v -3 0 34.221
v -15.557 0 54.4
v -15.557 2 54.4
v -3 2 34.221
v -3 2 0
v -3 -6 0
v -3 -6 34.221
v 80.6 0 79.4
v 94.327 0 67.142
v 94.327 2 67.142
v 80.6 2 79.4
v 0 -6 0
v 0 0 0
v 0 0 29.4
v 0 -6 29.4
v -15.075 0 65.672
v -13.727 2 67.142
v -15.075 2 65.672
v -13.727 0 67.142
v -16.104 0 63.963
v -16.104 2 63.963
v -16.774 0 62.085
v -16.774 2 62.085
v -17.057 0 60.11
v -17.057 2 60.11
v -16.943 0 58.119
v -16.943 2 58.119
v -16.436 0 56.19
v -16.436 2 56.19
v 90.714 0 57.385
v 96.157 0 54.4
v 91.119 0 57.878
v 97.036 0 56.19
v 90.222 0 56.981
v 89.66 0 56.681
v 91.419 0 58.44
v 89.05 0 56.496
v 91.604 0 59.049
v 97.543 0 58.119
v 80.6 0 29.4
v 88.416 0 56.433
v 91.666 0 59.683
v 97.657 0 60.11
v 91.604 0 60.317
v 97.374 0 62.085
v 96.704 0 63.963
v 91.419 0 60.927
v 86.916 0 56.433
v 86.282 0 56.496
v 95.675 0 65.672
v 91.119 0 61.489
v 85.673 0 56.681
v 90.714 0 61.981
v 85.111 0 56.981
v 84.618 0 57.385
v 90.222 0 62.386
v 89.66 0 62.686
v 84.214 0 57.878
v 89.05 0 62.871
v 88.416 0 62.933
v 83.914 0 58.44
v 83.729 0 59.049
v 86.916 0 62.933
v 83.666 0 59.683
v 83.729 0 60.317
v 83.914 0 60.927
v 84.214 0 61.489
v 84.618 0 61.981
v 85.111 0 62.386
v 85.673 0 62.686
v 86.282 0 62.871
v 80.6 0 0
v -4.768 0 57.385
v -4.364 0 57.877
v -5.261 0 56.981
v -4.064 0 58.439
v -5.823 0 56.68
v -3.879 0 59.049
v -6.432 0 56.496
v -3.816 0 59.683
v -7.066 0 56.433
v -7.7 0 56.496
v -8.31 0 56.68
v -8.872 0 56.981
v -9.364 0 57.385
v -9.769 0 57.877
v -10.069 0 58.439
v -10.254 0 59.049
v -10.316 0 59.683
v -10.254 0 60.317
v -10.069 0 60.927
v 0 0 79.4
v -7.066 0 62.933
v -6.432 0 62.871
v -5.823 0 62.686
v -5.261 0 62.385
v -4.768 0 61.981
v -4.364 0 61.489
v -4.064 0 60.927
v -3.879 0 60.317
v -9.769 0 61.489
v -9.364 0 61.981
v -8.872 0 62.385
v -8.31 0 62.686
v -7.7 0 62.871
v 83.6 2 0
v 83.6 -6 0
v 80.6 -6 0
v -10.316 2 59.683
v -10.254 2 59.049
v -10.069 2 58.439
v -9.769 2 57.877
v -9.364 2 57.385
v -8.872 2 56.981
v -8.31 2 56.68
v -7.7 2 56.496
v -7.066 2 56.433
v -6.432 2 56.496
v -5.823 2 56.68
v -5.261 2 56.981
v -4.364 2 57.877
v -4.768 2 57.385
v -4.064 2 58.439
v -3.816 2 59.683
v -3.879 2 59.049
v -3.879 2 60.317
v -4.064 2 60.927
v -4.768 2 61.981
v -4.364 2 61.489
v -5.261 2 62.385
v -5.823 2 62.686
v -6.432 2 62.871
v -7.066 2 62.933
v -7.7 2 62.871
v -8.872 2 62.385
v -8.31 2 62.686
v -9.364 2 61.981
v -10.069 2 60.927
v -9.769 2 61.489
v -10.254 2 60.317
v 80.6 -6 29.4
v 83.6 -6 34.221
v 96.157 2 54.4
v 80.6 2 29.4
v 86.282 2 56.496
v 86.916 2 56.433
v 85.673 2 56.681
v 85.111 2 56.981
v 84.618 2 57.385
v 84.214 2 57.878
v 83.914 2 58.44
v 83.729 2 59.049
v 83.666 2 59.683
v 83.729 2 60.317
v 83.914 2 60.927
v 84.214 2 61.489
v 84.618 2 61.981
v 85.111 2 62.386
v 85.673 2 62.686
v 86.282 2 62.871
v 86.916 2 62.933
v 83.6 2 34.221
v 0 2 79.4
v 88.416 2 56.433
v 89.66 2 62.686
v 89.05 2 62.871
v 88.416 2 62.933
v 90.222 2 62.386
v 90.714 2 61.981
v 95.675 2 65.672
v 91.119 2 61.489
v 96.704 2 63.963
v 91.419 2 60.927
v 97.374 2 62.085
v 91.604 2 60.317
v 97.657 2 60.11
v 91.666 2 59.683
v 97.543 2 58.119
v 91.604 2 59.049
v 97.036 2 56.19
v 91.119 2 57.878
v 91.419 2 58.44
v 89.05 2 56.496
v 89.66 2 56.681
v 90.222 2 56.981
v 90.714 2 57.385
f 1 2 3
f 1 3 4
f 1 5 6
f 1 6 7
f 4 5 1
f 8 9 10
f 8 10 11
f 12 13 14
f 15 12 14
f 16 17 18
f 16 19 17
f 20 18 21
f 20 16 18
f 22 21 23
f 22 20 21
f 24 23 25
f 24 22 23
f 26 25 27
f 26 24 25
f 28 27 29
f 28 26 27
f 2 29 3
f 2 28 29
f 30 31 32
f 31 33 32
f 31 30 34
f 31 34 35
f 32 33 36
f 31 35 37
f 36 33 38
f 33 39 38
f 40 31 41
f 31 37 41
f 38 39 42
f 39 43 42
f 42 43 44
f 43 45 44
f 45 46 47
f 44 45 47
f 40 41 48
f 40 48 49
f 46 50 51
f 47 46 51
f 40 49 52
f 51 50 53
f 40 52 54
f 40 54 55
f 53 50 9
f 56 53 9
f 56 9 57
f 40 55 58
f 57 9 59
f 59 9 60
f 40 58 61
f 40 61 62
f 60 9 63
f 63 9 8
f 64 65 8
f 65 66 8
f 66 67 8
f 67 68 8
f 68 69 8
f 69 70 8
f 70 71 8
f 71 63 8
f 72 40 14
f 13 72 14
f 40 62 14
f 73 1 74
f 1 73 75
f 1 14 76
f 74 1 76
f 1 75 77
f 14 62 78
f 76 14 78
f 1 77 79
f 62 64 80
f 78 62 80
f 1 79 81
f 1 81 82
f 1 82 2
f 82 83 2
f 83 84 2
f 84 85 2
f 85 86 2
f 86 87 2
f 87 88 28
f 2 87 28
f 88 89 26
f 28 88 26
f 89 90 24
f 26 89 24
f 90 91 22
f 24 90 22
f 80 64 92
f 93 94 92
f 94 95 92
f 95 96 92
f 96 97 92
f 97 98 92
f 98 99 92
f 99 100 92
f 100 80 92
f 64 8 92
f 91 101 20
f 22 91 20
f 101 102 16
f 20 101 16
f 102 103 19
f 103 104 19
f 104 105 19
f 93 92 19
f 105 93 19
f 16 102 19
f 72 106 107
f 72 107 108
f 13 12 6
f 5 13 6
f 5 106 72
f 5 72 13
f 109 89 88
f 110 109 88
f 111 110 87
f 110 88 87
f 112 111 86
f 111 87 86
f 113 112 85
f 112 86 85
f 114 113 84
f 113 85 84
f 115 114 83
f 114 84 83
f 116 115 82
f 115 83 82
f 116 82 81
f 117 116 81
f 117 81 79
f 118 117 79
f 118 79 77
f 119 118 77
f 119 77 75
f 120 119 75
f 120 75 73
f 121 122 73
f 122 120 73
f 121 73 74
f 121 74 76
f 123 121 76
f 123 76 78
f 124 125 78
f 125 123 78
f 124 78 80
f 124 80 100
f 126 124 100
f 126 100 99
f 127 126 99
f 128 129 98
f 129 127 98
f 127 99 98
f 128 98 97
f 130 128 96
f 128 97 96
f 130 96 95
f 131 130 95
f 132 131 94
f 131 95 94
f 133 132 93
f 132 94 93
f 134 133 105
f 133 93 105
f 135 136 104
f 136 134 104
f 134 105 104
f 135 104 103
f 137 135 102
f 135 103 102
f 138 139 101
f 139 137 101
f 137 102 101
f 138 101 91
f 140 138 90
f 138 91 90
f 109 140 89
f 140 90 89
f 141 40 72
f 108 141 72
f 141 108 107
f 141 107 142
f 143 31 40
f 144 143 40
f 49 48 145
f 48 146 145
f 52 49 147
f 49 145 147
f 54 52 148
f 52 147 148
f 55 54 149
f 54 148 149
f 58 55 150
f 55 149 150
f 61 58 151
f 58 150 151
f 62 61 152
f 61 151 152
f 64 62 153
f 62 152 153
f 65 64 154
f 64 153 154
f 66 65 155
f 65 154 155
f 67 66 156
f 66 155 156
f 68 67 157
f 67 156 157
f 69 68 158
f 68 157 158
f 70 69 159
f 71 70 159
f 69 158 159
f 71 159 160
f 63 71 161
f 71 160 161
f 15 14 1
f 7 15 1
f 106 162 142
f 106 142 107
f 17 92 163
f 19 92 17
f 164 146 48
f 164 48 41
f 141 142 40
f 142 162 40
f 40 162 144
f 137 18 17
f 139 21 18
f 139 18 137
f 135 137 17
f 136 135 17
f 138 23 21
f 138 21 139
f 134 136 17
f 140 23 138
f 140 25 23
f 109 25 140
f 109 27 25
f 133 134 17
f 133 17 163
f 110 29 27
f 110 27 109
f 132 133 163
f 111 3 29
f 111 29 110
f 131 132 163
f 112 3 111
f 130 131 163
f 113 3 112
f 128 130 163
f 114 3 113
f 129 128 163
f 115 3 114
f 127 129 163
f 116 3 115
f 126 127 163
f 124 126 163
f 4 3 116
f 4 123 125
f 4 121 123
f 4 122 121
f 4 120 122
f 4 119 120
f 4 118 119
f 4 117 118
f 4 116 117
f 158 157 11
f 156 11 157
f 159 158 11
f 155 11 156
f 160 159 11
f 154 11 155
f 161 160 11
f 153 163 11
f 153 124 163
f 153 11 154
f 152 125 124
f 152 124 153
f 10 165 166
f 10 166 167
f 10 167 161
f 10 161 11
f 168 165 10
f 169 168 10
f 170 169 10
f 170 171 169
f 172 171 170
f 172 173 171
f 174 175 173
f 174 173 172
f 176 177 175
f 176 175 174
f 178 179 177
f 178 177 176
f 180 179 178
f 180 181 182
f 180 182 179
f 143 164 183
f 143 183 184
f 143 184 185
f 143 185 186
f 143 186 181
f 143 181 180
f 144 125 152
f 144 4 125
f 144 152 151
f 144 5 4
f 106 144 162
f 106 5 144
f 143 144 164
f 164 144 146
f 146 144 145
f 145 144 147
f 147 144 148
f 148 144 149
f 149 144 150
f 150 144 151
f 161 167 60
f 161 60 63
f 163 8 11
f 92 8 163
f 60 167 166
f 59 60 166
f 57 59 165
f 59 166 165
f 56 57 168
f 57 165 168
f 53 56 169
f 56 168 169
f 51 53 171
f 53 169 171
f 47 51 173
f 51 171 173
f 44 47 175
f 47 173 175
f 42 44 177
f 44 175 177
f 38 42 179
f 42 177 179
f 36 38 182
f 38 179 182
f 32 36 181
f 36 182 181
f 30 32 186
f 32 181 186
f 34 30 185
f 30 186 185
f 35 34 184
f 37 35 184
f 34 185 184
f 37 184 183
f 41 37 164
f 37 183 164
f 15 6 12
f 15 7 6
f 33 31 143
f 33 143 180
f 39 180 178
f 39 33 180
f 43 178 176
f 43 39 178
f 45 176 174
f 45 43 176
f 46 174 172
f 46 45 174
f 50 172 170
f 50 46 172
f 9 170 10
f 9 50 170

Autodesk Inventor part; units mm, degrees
ref_plane "YZ Plane" through (0, 0, 0) normal (1, 0, 0) x (0, 1, 0)
ref_plane "XZ Plane" through (0, 0, 0) normal (0, 1, 0) x (-1, 0, 0)
sketch "草圖1" plane through (0, 0, 0) normal (0, 1, 0) x (-1, 0, 0)
  line L0 (0, 0) -> (-80.6, 0)
  line L1 (-80.6, 0) -> (-80.6, 79.4)
  line L2 (-80.6, 79.4) -> (0, 79.4)
  line L3 (0, 79.4) -> (0, 0)
  line L4 (-80.6, 79.4) -> (-80.6, 51.023)
  line L5 (-80.6, 79.4) -> (-80.6, 51.023)
  line L6 (-80.6, 51.023) -> (-80.6, 79.4)
  line L7 (-94.3269, 67.1422) -> (-80.6, 79.4)
  line L8 (-96.1567, 54.4) -> (-80.6, 29.4)
  circle A0 centre (-87.6663, 59.6833) radius 3.25
  arc A1 (-94.3269, 67.1422) -> (-96.1567, 54.4) centre (-87.6663, 59.6833) ccw
  line L9 (-40.2, 92.1708) -> (-40.2, -8.9293) construction
  line L10 (0, 79.4) -> (13.727, 67.142)
  line L11 (15.5567, 54.3998) -> (0, 29.3998)
  circle A2 centre (7.0663, 59.6831) radius 3.25
  arc A3 (15.5567, 54.3998) -> (13.727, 67.142) centre (7.0663, 59.6831) ccw
  point P0 (-100.6, 61.5405)
  point P1 (20, 61.5403)
  point P2 (17.5946, 57.6964)
  point P3 (10.5946, 57.6964)
  dimension "d0" = 80.6
  dimension "d1" = 79.4
  dimension "d7" = 50
  dimension "d10" = 20
  dimension "d11" = 6.5
  dimension "d12" = 10
  dimension "d13" = 25
  dimension "d17" = 20
  dimension "d18" = 6.5
  dimension "d19" = 10
  dimension "d20" = 25
  dimension "d42" = 7
  dimension "d51" = 13.727
extrude "擠出1" add sketch "草圖1" along normal blind 2
sketch "草圖11" plane through (0, 2, 0) normal (0, 1, 0) x (1, 0, 0)
  circle A0 centre (87.6663, -59.6833) radius 3.25 construction
  line L0 (88.4163, -62.9333) -> (86.9163, -62.9333)
  line L1 (83.6663, -59.6833) -> (83.6663, -59.6833)
  line L2 (86.9163, -56.4333) -> (88.4163, -56.4333)
  line L3 (91.6663, -59.6833) -> (91.6663, -59.6833)
  arc A1 (88.4163, -62.9333) -> (91.6663, -59.6833) centre (88.4163, -59.6833) ccw
  arc A2 (91.6663, -59.6833) -> (88.4163, -56.4333) centre (88.4163, -59.6833) ccw
  arc A3 (86.9163, -56.4333) -> (83.6663, -59.6833) centre (86.9163, -59.6833) ccw
  arc A4 (83.6663, -59.6833) -> (86.9163, -62.9333) centre (86.9163, -59.6833) ccw
  point P0 (0, 0)
  dimension "d46" = 4
  dimension "d47" = 4
  dimension "d48" = 3.25
extrude "擠出5" cut sketch "草圖11" against normal through all
sketch "草圖18" plane through (0, 2, 0) normal (0, 1, 0) x (1, 0, 0)
  line L0 (0, 0) -> (-3, 0)
  line L1 (0, -29.3998) -> (-15.5567, -54.3998) projected
  line L2 (0, 0) -> (0, -29.3998) projected
  line L3 (-3, 0) -> (-3, -34.2209)
  line L4 (40.2999, -89.2199) -> (40.2999, 11.3236) construction
  line L5 (80.5999, 0) -> (83.5999, 0)
  line L6 (80.5999, 0) -> (80.5999, -29.3998)
  line L7 (83.5999, 0) -> (83.5999, -34.2209)
  line L8 (96.1567, -54.4) -> (80.6, -29.4) projected
  line L9 (83.5999, -34.2209) -> (80.6, -29.4)
  dimension "d60" = 3
extrude "擠出7" add sketch "草圖18" against normal blind 8 contours L2 L1 L3 L0
ref_plane "工作平面4" through (40.3, -6, 29.3998) normal (1, 0, 0) x (0, 0, -1)
mirror "鏡射2" about plane through (40.3, -6, 29.3998) normal (1, 0, 0) of "擠出7"
properties part number "mini5電腦支架"
